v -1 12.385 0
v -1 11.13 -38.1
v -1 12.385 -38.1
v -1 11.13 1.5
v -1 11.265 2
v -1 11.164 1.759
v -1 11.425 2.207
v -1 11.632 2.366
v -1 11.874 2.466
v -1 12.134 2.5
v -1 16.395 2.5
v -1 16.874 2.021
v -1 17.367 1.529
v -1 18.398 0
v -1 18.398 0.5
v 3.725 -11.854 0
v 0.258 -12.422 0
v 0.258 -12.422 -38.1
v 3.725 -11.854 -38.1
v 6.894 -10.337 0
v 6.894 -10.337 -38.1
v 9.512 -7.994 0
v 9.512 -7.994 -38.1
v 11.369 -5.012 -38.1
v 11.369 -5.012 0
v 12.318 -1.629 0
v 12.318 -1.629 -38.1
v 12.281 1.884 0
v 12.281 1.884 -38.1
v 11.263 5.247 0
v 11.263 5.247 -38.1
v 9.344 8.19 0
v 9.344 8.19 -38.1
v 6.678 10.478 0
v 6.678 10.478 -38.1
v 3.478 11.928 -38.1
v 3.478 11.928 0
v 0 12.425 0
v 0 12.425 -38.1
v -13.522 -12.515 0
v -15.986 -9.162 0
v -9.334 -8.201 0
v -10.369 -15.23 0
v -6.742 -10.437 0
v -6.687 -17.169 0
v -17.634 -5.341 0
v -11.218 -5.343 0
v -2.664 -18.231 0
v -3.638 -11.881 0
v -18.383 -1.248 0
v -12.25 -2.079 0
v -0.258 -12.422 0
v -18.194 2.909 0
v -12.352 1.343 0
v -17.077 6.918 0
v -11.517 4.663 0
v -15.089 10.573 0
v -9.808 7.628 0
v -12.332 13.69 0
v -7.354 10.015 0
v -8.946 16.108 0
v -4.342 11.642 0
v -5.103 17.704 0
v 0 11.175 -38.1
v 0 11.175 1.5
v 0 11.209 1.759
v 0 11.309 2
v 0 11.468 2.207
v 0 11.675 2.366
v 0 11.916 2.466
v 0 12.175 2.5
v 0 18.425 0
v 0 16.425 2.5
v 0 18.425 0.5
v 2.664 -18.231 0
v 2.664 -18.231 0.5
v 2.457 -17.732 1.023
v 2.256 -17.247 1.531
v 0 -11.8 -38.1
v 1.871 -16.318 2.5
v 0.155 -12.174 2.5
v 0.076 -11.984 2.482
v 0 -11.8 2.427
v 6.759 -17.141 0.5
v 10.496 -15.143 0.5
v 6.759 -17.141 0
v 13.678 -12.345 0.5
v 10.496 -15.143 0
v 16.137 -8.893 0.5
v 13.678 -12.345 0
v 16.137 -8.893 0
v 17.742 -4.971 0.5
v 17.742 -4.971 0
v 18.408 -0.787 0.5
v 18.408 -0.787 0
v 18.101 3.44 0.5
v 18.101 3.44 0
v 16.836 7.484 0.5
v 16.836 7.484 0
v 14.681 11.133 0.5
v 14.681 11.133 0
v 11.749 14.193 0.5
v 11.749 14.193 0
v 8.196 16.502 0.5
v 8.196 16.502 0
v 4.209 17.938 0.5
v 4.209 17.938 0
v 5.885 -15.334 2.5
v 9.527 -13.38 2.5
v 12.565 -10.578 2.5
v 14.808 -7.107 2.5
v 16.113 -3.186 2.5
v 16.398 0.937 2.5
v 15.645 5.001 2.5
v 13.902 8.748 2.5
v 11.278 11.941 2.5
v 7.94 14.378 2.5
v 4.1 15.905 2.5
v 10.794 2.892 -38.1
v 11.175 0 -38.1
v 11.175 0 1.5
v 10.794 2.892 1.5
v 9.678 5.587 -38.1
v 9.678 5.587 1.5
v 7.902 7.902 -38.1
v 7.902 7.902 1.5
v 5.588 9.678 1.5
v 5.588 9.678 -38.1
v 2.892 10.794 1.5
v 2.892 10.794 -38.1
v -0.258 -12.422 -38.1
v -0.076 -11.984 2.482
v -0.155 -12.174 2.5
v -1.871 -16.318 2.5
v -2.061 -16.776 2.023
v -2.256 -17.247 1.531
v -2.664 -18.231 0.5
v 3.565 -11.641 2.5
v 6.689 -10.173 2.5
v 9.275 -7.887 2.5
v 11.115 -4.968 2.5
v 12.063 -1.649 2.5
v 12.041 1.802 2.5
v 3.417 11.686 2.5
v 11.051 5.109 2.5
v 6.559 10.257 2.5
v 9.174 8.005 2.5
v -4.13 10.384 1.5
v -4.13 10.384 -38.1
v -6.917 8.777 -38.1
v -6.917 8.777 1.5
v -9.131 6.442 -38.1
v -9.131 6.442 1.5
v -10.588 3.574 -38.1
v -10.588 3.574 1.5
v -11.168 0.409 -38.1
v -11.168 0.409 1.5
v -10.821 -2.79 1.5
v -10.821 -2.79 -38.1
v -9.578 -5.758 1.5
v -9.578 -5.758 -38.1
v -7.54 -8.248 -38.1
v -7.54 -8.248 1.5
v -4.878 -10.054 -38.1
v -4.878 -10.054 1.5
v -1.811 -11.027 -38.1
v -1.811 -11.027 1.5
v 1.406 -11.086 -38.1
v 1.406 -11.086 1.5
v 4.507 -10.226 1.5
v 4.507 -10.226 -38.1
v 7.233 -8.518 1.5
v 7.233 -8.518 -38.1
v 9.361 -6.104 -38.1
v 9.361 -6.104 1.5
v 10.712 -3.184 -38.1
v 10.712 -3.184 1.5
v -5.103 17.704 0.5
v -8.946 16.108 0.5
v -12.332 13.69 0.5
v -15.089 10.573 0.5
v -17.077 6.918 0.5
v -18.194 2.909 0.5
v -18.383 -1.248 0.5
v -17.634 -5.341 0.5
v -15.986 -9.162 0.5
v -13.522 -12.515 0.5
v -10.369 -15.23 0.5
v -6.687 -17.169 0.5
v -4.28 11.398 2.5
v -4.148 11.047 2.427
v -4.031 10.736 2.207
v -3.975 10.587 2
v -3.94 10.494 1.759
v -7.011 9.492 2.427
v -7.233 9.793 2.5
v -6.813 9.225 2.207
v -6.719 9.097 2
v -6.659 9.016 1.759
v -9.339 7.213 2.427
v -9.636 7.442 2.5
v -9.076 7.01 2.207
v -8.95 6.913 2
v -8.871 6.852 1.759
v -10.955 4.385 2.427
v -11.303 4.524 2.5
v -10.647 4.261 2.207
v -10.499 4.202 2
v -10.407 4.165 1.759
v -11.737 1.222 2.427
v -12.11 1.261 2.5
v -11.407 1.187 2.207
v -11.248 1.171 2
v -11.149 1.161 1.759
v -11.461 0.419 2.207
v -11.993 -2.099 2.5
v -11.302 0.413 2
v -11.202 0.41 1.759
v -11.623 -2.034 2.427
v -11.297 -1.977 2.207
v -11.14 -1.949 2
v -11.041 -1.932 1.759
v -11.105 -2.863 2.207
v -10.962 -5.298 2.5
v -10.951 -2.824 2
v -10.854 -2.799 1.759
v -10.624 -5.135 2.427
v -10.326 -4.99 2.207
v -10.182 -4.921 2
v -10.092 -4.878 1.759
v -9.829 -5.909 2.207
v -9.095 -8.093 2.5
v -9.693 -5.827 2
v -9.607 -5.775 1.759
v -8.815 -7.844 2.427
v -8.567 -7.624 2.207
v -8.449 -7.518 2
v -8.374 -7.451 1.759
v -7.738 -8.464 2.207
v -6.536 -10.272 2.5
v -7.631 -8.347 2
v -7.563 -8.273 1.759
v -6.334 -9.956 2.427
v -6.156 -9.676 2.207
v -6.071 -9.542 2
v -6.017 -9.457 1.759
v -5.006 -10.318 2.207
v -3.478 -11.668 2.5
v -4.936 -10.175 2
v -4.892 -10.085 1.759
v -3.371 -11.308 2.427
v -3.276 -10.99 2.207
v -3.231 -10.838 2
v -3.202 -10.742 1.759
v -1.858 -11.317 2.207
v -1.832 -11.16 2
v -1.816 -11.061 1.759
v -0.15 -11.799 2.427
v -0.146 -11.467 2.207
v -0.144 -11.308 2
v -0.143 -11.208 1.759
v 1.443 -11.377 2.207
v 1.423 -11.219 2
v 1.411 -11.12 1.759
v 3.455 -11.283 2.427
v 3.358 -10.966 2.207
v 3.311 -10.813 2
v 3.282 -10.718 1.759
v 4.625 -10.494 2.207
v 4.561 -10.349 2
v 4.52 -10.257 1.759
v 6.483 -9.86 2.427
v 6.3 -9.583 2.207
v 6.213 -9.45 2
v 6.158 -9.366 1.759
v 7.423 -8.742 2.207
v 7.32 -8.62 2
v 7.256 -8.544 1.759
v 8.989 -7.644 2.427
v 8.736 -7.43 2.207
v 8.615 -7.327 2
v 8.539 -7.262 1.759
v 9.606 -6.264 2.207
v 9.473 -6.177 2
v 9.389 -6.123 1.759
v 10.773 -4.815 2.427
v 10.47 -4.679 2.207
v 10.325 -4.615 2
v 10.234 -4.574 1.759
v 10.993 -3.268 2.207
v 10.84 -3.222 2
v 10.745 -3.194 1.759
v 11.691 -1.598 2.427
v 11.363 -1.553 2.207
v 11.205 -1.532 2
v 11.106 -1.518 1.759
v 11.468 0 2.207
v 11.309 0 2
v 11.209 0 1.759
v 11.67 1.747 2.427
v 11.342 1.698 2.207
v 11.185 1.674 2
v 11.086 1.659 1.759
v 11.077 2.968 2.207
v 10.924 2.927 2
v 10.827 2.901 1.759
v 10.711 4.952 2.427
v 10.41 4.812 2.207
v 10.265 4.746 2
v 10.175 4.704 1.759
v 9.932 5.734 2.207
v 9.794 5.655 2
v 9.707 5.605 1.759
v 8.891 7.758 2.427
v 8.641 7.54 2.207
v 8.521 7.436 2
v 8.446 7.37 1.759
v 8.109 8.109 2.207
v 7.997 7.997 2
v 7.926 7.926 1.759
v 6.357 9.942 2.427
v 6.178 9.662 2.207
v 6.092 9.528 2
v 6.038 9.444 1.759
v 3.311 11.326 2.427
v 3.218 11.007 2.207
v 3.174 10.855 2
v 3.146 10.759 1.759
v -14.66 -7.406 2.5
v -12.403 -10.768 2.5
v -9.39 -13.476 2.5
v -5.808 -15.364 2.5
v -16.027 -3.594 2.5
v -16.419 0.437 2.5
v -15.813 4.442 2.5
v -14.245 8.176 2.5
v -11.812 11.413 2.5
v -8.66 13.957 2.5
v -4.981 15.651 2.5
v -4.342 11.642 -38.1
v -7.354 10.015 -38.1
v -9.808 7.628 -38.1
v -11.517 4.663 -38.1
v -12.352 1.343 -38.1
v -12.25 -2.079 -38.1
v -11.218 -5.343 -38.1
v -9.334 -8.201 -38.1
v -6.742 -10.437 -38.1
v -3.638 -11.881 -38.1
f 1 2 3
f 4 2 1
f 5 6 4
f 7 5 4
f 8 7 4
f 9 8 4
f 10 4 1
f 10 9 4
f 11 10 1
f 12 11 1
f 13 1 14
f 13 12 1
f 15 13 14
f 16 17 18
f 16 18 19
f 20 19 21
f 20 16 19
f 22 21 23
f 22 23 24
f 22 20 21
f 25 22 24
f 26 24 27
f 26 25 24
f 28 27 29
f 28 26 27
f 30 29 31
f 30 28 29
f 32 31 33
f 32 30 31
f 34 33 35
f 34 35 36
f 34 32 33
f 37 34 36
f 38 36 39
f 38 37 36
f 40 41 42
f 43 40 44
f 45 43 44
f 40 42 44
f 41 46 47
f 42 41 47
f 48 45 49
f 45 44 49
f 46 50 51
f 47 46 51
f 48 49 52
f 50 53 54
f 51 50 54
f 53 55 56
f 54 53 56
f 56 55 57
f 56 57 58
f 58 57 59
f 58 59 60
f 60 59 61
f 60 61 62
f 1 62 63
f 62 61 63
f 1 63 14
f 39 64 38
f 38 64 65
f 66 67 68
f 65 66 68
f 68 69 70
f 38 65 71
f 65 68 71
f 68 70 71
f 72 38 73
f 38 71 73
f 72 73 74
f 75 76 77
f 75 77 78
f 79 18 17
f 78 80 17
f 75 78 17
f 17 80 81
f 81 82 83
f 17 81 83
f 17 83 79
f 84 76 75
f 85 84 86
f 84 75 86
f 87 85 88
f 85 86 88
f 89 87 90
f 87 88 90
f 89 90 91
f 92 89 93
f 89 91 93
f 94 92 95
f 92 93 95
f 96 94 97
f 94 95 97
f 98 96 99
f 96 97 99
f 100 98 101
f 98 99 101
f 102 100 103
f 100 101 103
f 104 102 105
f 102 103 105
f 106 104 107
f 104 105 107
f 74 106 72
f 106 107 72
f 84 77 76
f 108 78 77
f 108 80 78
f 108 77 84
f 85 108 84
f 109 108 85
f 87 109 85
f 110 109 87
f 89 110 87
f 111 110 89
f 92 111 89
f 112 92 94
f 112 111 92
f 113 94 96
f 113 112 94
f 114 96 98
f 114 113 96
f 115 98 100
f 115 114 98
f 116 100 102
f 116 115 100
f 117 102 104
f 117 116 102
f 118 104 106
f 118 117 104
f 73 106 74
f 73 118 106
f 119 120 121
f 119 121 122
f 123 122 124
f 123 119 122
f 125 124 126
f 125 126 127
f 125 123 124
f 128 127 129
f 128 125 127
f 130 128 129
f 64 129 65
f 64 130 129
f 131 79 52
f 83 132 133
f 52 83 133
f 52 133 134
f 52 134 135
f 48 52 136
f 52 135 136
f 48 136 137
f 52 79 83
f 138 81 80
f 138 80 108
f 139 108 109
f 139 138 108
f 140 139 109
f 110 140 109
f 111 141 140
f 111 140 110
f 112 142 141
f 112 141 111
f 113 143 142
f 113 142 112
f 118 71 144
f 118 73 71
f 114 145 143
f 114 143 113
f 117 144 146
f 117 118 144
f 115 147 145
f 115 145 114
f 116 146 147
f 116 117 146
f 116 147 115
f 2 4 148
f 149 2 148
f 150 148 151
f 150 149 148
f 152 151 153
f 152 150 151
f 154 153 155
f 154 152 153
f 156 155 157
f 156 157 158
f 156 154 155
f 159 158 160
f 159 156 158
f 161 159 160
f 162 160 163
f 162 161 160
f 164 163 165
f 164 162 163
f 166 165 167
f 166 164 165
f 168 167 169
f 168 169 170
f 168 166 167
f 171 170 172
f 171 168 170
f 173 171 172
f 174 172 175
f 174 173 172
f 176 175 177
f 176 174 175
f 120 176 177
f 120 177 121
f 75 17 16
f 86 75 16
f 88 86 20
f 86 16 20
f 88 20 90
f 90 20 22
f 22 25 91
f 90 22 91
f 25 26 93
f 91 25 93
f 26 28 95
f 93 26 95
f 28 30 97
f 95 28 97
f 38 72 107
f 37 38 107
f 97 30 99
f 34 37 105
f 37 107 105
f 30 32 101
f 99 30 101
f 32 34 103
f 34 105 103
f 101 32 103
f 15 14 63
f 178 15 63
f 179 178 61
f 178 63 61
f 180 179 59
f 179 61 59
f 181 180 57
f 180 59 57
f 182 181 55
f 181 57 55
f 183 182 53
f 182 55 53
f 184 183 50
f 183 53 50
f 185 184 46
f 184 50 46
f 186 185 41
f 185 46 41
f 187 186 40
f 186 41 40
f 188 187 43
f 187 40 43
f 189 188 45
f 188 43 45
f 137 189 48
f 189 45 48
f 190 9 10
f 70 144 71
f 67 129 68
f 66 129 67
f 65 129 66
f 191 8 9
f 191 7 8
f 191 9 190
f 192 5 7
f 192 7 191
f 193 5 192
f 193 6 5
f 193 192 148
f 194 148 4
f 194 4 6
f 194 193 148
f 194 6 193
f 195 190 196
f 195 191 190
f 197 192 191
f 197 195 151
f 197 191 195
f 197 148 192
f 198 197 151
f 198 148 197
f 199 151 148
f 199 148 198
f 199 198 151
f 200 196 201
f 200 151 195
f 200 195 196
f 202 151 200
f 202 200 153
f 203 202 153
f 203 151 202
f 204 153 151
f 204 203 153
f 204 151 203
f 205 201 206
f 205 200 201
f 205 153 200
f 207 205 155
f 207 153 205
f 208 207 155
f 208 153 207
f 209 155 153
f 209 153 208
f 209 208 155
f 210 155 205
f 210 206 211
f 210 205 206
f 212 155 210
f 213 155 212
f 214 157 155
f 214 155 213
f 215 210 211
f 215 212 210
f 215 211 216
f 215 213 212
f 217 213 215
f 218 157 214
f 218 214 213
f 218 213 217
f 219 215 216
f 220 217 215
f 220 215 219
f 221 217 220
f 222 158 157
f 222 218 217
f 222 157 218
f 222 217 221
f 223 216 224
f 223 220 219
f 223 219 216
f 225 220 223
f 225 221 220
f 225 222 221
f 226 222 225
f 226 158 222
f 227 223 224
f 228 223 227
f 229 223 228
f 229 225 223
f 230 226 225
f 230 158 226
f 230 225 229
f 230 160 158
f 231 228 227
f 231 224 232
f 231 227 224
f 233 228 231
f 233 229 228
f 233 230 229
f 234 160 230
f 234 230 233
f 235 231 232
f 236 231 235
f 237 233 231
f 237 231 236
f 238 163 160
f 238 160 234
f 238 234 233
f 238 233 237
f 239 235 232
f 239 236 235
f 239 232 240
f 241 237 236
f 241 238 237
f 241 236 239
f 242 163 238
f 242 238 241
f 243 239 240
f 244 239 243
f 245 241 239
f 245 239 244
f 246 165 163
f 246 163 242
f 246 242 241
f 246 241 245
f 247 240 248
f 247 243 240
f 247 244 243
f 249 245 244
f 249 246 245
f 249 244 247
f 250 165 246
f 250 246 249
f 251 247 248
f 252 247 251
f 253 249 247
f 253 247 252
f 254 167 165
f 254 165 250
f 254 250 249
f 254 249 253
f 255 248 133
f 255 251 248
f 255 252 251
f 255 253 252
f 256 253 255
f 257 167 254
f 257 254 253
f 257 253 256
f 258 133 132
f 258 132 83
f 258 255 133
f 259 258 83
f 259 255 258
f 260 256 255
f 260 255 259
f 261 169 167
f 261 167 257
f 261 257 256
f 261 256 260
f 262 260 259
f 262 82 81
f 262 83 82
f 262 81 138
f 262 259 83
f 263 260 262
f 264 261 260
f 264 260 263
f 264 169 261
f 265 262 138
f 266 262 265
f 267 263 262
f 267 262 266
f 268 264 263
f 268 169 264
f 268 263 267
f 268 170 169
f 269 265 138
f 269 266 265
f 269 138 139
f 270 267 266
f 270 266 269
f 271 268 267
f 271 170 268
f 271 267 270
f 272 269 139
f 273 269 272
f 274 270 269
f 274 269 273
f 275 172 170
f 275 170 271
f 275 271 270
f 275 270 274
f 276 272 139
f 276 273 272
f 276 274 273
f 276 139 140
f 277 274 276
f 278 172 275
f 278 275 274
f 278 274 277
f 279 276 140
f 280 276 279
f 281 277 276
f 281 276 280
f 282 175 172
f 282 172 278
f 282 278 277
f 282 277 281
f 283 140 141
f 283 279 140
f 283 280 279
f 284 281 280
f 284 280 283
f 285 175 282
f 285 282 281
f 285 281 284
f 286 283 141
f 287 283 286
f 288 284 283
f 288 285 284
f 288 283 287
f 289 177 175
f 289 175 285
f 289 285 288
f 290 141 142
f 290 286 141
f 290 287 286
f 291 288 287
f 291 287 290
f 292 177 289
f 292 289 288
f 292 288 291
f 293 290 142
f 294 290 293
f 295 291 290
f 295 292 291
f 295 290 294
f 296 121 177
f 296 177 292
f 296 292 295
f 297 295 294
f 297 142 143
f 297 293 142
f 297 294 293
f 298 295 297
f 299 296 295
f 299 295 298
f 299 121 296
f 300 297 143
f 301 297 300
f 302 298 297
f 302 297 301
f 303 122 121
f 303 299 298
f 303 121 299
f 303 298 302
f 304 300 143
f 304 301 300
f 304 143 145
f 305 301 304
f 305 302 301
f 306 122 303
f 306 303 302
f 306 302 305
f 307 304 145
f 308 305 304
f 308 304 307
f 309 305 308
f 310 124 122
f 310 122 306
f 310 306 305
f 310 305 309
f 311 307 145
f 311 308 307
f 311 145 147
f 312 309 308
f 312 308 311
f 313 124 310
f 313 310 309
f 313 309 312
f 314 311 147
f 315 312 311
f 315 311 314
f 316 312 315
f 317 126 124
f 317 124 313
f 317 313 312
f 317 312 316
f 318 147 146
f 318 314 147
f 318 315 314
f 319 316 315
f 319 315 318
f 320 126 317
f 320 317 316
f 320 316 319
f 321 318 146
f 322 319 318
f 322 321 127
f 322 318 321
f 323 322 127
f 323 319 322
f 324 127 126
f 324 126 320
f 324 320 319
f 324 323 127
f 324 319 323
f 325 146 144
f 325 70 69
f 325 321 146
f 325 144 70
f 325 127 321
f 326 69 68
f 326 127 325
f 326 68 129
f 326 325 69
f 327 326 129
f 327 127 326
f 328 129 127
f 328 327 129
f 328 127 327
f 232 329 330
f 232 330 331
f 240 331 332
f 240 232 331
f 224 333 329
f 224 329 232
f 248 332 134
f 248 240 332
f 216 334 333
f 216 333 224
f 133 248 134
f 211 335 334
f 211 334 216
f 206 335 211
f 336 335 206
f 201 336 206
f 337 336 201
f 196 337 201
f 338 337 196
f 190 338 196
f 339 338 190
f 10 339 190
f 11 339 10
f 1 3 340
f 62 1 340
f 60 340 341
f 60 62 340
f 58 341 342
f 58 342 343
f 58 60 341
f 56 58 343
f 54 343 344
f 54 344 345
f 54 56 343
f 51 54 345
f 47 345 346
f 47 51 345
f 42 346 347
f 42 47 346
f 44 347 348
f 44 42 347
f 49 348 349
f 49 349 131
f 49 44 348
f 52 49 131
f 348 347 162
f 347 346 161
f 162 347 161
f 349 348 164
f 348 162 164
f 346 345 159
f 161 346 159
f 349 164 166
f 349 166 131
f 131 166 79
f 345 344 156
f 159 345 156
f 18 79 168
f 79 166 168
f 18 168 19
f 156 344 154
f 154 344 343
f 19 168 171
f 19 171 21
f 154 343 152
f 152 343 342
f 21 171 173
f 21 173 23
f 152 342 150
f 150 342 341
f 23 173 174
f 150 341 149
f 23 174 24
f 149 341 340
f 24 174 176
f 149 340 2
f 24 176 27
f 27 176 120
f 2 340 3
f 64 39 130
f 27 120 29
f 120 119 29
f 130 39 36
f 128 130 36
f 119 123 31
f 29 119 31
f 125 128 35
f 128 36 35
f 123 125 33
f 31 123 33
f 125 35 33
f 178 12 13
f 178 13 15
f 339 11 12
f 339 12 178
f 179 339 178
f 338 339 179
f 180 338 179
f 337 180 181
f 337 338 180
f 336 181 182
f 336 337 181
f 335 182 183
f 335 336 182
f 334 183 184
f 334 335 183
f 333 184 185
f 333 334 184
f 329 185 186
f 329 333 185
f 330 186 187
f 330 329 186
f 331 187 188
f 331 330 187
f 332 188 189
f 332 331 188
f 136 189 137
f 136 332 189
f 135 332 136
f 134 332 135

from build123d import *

# Parameters (mm, degrees)
F0_R     = 12.425
F0_R_2   = 11.175
F1_DEPTH = 38.1
F0_R_3   = 18.425
F2_DEPTH = 2.5
F3_SIZE  = 2
F4_R     = 1
F5_W     = 26.7045460641
F5_H     = 56.1363650486
F6_DEPTH = 1
F8_DEPTH = 50


with BuildPart() as f1:
    # F0 (on Top) → F1 (new body)
    with BuildSketch(Plane.XY):
        Circle(F0_R)
        Circle(F0_R_2, mode=Mode.SUBTRACT)
    extrude(amount=-F1_DEPTH)

    # F0 (on Top) → F2 (join)
    with BuildSketch(Plane.XY):
        Circle(F0_R_3)
        Circle(F0_R, mode=Mode.SUBTRACT)
        Circle(F0_R)
        Circle(F0_R_2, mode=Mode.SUBTRACT)
    extrude(amount=F2_DEPTH)

    # F3
    f3_edges = [f1.edges().sort_by_distance(p)[0] for p in [
        (-18.425, 0, 2.5),
    ]]
    chamfer(f3_edges, length=F3_SIZE)

    # F4
    f4_edges = [f1.edges().sort_by_distance(p)[0] for p in [
        (-11.175, 0, 2.5),
    ]]
    fillet(f4_edges, radius=F4_R)

    # F5 (on Right) → F6 (cut)
    with BuildSketch(Plane.YZ):
        with Locations((13.3522730321, -17.5000005402)):
            Rectangle(F5_W, F5_H)
    extrude(amount=-F6_DEPTH, mode=Mode.SUBTRACT)

    # F7 (on Top) → F8 (cut, symmetric)
    with BuildSketch(Plane.XY):
        Polygon((5.7434663265, -25.6659543005), (0, -11.8), (-5.7434663265, -25.6659543005), align=None)
    extrude(amount=F8_DEPTH, both=True, mode=Mode.SUBTRACT)


solid = f1.part
